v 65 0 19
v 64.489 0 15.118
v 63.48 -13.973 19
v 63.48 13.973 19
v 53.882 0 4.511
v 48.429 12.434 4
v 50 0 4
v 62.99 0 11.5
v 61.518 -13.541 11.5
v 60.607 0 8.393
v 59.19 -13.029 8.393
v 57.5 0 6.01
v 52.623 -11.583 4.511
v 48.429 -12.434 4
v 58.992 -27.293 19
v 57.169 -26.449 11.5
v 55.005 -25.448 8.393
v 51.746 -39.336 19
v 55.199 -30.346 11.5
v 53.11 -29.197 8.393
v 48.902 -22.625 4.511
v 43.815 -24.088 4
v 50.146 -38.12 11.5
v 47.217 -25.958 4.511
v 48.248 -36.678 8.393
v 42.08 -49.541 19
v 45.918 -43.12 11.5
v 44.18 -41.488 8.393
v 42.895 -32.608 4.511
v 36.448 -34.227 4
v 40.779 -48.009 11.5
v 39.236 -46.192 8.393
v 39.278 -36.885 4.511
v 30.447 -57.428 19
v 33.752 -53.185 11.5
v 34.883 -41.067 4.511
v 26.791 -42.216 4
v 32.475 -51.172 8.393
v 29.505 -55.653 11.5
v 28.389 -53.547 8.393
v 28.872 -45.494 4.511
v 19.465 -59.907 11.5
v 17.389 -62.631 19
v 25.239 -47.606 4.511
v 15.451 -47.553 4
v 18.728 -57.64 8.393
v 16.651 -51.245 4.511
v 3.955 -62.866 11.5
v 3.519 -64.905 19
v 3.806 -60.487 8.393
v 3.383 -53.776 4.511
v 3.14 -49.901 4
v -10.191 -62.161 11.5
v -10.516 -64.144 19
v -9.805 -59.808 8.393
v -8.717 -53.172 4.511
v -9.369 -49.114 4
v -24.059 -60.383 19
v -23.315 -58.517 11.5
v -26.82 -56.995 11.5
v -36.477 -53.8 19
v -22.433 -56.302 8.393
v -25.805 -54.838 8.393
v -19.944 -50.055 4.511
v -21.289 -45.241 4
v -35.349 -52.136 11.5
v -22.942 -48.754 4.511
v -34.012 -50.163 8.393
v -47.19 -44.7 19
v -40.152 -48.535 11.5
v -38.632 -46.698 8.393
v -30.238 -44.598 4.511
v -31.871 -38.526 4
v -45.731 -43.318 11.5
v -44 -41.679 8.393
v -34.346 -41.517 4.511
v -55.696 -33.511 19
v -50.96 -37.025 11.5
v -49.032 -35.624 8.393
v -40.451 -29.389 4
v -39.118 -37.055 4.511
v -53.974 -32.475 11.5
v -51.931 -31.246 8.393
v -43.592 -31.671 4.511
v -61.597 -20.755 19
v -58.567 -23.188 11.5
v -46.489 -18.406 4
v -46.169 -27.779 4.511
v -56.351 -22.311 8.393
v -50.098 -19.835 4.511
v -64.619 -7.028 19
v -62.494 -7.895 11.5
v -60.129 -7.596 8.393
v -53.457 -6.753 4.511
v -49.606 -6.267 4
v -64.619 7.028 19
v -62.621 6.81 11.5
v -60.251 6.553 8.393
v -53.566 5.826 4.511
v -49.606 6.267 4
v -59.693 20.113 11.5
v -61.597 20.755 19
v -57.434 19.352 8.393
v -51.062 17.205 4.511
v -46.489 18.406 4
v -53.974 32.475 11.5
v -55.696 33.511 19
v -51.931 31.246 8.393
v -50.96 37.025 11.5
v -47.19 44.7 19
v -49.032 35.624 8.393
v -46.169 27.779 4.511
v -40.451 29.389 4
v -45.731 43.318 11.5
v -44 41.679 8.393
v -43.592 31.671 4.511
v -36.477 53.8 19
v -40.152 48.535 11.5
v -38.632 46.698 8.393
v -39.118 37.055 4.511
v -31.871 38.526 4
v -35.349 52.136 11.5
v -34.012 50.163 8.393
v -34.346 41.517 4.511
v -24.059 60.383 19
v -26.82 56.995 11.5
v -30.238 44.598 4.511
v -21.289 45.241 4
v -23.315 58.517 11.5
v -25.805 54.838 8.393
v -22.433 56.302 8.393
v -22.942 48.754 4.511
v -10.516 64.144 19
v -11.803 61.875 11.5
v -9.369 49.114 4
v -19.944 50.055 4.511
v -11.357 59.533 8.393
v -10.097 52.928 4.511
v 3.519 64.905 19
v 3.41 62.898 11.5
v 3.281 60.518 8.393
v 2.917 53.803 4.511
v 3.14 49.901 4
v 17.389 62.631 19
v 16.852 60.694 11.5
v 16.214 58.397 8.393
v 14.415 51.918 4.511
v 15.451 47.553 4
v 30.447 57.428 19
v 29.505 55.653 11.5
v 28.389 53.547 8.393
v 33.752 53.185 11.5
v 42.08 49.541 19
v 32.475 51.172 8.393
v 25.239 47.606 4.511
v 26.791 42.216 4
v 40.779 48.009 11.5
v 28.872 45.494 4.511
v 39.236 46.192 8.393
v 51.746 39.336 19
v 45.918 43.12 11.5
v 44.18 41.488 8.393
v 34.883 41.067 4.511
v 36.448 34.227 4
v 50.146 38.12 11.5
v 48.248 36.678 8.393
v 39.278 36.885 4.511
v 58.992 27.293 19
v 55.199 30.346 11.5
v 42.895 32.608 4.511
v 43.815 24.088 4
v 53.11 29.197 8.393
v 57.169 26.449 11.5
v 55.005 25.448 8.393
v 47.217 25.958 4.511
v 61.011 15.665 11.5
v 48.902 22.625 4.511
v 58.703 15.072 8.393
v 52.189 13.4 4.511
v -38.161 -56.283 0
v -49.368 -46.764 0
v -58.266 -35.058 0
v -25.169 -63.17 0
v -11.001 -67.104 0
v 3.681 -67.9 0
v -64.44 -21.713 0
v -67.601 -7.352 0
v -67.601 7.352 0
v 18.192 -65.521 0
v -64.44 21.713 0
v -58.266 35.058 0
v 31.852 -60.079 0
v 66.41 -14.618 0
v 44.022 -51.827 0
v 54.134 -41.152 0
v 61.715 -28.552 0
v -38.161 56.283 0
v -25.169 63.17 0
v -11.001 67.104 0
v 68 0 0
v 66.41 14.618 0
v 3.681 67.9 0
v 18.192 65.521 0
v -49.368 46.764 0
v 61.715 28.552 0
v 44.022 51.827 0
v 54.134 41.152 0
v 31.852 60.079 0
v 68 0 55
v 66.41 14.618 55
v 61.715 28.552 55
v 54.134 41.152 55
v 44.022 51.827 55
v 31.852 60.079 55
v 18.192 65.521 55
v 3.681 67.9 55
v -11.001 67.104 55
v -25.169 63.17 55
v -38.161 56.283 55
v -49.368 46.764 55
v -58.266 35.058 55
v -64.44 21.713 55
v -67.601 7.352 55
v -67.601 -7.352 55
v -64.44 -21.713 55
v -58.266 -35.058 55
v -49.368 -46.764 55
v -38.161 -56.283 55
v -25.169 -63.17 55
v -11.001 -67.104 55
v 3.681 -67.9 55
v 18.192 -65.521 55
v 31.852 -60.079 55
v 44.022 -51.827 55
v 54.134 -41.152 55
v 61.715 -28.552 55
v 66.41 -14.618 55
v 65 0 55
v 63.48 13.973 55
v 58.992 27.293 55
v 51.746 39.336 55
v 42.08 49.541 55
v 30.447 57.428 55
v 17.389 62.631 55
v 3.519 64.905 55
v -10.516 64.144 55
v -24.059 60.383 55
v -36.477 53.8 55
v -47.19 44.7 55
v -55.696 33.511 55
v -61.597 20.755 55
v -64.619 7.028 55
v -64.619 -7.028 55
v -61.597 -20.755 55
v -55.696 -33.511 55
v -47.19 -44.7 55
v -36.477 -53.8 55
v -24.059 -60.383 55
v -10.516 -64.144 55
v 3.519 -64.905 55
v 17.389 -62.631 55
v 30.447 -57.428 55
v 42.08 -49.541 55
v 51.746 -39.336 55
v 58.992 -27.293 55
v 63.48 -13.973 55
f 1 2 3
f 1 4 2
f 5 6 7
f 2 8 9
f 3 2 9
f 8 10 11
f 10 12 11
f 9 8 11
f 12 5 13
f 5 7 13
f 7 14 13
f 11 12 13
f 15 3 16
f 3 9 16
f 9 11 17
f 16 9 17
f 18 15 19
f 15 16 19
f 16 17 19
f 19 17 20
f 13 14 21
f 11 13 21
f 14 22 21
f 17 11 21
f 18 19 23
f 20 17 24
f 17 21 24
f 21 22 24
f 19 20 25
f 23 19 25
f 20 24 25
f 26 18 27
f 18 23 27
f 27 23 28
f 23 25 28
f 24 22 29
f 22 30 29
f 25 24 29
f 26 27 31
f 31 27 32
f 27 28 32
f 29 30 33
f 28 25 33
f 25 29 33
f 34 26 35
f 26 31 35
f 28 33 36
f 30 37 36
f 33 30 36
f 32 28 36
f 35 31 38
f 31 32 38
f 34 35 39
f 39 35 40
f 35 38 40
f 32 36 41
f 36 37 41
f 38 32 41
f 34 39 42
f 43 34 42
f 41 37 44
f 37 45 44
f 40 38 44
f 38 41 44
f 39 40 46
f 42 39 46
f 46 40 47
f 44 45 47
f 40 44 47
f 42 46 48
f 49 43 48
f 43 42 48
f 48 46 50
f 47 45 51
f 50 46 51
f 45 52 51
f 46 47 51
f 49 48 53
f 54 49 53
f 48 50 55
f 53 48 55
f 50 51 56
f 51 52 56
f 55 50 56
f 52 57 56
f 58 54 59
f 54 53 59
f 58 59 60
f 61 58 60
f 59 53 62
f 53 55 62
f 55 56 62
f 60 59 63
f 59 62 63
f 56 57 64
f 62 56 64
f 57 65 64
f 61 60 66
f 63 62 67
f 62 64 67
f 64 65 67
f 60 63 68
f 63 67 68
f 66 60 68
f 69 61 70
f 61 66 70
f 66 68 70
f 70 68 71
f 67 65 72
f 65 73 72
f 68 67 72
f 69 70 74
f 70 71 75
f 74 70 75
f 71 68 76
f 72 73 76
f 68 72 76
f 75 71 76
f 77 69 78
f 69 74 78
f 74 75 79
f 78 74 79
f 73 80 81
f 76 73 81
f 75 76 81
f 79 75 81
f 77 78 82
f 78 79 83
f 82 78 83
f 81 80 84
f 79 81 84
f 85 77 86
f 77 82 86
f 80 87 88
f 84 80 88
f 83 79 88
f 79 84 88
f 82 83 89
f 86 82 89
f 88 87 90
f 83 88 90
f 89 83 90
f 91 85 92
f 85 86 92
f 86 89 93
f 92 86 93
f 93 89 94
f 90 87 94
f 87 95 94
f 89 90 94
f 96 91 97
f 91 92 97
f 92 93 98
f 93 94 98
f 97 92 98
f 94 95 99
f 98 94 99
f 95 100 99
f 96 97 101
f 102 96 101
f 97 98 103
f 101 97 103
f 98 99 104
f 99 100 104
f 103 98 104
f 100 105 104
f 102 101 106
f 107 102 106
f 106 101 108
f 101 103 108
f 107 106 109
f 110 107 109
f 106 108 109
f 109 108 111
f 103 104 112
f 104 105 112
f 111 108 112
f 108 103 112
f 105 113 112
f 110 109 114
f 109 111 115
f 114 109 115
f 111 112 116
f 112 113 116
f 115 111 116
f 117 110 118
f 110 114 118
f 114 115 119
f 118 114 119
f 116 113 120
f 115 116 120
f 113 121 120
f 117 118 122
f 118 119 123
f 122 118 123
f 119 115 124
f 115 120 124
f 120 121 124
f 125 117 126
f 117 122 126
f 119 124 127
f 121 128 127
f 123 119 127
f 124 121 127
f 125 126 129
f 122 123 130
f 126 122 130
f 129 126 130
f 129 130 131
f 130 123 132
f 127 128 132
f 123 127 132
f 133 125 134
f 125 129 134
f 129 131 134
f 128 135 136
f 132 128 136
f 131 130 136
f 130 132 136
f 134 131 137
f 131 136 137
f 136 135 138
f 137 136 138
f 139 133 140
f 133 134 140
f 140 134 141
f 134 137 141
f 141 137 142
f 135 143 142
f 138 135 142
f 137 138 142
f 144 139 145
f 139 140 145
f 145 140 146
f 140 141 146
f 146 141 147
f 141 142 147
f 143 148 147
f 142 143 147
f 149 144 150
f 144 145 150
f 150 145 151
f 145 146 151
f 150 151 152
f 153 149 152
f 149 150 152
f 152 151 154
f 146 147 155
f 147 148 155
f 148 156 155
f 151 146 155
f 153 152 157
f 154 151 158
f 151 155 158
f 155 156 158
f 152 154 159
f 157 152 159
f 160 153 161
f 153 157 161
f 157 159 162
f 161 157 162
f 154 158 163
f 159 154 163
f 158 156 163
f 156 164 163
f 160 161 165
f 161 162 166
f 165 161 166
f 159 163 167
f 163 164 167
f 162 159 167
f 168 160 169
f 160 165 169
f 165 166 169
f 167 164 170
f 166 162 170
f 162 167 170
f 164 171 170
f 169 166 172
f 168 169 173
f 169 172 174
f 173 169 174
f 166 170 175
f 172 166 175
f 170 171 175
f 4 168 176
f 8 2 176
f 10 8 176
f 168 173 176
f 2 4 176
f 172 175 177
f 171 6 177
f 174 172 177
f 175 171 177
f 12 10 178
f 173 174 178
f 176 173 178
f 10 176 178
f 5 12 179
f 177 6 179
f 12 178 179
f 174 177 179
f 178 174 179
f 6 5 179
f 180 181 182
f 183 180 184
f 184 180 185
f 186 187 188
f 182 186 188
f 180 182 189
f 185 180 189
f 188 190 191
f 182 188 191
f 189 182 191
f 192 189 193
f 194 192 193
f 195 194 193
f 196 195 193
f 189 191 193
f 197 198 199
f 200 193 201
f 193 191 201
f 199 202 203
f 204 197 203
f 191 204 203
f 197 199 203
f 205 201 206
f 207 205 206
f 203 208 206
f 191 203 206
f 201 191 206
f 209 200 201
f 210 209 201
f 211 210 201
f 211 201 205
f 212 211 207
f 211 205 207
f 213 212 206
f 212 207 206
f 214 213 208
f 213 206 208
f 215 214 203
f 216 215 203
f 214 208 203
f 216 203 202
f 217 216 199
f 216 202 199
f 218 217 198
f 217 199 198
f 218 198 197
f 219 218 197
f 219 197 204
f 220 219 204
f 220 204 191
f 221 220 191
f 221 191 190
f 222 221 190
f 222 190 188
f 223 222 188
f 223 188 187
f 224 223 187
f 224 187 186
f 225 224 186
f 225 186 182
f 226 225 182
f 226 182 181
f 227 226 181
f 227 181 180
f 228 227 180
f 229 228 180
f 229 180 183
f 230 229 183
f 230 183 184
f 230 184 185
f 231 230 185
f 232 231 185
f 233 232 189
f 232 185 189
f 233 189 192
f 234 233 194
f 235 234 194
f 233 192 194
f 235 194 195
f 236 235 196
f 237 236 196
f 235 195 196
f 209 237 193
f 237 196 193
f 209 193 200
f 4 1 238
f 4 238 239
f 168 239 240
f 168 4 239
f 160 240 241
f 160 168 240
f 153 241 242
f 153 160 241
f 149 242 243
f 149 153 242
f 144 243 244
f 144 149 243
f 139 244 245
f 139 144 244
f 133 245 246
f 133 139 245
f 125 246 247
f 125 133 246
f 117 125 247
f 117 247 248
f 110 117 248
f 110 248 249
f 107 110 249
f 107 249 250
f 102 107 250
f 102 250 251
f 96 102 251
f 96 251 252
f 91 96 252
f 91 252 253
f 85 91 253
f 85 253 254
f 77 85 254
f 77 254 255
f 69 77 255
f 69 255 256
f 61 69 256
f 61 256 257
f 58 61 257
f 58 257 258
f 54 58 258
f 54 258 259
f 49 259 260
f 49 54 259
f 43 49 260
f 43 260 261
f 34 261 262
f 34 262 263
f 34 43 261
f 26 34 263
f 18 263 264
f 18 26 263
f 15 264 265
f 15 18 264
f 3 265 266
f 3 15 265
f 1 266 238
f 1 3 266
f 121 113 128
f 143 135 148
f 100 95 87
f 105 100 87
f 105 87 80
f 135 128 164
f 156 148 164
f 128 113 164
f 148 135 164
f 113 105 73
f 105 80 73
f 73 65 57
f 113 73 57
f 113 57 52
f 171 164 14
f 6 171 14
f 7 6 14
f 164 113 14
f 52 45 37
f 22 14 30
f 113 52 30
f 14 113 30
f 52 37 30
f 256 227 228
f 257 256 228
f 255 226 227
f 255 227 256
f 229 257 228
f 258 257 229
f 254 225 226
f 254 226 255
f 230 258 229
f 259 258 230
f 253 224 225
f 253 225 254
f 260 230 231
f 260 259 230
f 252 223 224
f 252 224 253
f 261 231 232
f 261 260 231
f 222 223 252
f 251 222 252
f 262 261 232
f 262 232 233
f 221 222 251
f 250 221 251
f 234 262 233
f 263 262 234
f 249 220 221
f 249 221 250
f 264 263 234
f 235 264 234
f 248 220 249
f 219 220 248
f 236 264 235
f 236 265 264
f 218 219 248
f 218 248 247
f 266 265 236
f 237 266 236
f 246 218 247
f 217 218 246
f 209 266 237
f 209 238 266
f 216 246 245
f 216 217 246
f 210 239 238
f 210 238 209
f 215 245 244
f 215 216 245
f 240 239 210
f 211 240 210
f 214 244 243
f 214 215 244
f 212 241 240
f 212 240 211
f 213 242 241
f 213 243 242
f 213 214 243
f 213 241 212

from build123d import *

# Parameters (mm, degrees)
SKETCH_1_R        = 68
SKETCH_1_R_2      = 65
EXTRUDE_1_DEPTH   = 55
SKETCH_2_R        = 68
EXTRUDE_1_2_DEPTH = 4
FILLET_1_R        = 15


with BuildPart() as part:
    # 草图1 → Extrude 1 (new body)
    with BuildSketch(Plane.XY):
        Circle(SKETCH_1_R)
        Circle(SKETCH_1_R_2, mode=Mode.SUBTRACT)
    extrude(amount=EXTRUDE_1_DEPTH)

    # 草图2 → Extrude 1 2 (add)
    with BuildSketch(Plane(origin=(0, 0, 0), x_dir=(-1, 0, 0), z_dir=(0, 0, -1))):
        with Locations(Location((0, 0, 0), (0, 0, 180))):
            Circle(SKETCH_2_R)
    extrude(amount=-EXTRUDE_1_2_DEPTH)

    # 圆角1
    fillet_1_edges = [part.edges().sort_by_distance(p)[0] for p in [
        (-65, 0, 4),
    ]]
    fillet(fillet_1_edges, radius=FILLET_1_R)


solid = part.part
